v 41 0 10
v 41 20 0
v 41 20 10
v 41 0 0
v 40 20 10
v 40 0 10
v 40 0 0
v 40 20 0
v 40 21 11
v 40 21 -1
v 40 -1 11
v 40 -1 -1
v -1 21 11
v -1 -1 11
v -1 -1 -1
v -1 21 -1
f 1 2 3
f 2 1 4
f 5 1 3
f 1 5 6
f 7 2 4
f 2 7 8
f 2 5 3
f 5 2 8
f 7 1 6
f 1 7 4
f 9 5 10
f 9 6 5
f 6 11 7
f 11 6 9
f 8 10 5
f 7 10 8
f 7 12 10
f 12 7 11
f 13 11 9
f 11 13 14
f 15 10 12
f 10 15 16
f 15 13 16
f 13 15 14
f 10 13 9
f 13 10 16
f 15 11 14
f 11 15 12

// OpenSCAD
// Unit of length: Unit.MM
union()
{
   color(c = [1.0, 0.0, 0.0, 1.0])
   {
      cube(size = [41.0, 20.0, 10.0], center = false);
   }
   translate(v = [-1.0, -1.0, -1.0])
   {
      cube(size = [41.0, 22.0, 12.0], center = false);
   }
}
